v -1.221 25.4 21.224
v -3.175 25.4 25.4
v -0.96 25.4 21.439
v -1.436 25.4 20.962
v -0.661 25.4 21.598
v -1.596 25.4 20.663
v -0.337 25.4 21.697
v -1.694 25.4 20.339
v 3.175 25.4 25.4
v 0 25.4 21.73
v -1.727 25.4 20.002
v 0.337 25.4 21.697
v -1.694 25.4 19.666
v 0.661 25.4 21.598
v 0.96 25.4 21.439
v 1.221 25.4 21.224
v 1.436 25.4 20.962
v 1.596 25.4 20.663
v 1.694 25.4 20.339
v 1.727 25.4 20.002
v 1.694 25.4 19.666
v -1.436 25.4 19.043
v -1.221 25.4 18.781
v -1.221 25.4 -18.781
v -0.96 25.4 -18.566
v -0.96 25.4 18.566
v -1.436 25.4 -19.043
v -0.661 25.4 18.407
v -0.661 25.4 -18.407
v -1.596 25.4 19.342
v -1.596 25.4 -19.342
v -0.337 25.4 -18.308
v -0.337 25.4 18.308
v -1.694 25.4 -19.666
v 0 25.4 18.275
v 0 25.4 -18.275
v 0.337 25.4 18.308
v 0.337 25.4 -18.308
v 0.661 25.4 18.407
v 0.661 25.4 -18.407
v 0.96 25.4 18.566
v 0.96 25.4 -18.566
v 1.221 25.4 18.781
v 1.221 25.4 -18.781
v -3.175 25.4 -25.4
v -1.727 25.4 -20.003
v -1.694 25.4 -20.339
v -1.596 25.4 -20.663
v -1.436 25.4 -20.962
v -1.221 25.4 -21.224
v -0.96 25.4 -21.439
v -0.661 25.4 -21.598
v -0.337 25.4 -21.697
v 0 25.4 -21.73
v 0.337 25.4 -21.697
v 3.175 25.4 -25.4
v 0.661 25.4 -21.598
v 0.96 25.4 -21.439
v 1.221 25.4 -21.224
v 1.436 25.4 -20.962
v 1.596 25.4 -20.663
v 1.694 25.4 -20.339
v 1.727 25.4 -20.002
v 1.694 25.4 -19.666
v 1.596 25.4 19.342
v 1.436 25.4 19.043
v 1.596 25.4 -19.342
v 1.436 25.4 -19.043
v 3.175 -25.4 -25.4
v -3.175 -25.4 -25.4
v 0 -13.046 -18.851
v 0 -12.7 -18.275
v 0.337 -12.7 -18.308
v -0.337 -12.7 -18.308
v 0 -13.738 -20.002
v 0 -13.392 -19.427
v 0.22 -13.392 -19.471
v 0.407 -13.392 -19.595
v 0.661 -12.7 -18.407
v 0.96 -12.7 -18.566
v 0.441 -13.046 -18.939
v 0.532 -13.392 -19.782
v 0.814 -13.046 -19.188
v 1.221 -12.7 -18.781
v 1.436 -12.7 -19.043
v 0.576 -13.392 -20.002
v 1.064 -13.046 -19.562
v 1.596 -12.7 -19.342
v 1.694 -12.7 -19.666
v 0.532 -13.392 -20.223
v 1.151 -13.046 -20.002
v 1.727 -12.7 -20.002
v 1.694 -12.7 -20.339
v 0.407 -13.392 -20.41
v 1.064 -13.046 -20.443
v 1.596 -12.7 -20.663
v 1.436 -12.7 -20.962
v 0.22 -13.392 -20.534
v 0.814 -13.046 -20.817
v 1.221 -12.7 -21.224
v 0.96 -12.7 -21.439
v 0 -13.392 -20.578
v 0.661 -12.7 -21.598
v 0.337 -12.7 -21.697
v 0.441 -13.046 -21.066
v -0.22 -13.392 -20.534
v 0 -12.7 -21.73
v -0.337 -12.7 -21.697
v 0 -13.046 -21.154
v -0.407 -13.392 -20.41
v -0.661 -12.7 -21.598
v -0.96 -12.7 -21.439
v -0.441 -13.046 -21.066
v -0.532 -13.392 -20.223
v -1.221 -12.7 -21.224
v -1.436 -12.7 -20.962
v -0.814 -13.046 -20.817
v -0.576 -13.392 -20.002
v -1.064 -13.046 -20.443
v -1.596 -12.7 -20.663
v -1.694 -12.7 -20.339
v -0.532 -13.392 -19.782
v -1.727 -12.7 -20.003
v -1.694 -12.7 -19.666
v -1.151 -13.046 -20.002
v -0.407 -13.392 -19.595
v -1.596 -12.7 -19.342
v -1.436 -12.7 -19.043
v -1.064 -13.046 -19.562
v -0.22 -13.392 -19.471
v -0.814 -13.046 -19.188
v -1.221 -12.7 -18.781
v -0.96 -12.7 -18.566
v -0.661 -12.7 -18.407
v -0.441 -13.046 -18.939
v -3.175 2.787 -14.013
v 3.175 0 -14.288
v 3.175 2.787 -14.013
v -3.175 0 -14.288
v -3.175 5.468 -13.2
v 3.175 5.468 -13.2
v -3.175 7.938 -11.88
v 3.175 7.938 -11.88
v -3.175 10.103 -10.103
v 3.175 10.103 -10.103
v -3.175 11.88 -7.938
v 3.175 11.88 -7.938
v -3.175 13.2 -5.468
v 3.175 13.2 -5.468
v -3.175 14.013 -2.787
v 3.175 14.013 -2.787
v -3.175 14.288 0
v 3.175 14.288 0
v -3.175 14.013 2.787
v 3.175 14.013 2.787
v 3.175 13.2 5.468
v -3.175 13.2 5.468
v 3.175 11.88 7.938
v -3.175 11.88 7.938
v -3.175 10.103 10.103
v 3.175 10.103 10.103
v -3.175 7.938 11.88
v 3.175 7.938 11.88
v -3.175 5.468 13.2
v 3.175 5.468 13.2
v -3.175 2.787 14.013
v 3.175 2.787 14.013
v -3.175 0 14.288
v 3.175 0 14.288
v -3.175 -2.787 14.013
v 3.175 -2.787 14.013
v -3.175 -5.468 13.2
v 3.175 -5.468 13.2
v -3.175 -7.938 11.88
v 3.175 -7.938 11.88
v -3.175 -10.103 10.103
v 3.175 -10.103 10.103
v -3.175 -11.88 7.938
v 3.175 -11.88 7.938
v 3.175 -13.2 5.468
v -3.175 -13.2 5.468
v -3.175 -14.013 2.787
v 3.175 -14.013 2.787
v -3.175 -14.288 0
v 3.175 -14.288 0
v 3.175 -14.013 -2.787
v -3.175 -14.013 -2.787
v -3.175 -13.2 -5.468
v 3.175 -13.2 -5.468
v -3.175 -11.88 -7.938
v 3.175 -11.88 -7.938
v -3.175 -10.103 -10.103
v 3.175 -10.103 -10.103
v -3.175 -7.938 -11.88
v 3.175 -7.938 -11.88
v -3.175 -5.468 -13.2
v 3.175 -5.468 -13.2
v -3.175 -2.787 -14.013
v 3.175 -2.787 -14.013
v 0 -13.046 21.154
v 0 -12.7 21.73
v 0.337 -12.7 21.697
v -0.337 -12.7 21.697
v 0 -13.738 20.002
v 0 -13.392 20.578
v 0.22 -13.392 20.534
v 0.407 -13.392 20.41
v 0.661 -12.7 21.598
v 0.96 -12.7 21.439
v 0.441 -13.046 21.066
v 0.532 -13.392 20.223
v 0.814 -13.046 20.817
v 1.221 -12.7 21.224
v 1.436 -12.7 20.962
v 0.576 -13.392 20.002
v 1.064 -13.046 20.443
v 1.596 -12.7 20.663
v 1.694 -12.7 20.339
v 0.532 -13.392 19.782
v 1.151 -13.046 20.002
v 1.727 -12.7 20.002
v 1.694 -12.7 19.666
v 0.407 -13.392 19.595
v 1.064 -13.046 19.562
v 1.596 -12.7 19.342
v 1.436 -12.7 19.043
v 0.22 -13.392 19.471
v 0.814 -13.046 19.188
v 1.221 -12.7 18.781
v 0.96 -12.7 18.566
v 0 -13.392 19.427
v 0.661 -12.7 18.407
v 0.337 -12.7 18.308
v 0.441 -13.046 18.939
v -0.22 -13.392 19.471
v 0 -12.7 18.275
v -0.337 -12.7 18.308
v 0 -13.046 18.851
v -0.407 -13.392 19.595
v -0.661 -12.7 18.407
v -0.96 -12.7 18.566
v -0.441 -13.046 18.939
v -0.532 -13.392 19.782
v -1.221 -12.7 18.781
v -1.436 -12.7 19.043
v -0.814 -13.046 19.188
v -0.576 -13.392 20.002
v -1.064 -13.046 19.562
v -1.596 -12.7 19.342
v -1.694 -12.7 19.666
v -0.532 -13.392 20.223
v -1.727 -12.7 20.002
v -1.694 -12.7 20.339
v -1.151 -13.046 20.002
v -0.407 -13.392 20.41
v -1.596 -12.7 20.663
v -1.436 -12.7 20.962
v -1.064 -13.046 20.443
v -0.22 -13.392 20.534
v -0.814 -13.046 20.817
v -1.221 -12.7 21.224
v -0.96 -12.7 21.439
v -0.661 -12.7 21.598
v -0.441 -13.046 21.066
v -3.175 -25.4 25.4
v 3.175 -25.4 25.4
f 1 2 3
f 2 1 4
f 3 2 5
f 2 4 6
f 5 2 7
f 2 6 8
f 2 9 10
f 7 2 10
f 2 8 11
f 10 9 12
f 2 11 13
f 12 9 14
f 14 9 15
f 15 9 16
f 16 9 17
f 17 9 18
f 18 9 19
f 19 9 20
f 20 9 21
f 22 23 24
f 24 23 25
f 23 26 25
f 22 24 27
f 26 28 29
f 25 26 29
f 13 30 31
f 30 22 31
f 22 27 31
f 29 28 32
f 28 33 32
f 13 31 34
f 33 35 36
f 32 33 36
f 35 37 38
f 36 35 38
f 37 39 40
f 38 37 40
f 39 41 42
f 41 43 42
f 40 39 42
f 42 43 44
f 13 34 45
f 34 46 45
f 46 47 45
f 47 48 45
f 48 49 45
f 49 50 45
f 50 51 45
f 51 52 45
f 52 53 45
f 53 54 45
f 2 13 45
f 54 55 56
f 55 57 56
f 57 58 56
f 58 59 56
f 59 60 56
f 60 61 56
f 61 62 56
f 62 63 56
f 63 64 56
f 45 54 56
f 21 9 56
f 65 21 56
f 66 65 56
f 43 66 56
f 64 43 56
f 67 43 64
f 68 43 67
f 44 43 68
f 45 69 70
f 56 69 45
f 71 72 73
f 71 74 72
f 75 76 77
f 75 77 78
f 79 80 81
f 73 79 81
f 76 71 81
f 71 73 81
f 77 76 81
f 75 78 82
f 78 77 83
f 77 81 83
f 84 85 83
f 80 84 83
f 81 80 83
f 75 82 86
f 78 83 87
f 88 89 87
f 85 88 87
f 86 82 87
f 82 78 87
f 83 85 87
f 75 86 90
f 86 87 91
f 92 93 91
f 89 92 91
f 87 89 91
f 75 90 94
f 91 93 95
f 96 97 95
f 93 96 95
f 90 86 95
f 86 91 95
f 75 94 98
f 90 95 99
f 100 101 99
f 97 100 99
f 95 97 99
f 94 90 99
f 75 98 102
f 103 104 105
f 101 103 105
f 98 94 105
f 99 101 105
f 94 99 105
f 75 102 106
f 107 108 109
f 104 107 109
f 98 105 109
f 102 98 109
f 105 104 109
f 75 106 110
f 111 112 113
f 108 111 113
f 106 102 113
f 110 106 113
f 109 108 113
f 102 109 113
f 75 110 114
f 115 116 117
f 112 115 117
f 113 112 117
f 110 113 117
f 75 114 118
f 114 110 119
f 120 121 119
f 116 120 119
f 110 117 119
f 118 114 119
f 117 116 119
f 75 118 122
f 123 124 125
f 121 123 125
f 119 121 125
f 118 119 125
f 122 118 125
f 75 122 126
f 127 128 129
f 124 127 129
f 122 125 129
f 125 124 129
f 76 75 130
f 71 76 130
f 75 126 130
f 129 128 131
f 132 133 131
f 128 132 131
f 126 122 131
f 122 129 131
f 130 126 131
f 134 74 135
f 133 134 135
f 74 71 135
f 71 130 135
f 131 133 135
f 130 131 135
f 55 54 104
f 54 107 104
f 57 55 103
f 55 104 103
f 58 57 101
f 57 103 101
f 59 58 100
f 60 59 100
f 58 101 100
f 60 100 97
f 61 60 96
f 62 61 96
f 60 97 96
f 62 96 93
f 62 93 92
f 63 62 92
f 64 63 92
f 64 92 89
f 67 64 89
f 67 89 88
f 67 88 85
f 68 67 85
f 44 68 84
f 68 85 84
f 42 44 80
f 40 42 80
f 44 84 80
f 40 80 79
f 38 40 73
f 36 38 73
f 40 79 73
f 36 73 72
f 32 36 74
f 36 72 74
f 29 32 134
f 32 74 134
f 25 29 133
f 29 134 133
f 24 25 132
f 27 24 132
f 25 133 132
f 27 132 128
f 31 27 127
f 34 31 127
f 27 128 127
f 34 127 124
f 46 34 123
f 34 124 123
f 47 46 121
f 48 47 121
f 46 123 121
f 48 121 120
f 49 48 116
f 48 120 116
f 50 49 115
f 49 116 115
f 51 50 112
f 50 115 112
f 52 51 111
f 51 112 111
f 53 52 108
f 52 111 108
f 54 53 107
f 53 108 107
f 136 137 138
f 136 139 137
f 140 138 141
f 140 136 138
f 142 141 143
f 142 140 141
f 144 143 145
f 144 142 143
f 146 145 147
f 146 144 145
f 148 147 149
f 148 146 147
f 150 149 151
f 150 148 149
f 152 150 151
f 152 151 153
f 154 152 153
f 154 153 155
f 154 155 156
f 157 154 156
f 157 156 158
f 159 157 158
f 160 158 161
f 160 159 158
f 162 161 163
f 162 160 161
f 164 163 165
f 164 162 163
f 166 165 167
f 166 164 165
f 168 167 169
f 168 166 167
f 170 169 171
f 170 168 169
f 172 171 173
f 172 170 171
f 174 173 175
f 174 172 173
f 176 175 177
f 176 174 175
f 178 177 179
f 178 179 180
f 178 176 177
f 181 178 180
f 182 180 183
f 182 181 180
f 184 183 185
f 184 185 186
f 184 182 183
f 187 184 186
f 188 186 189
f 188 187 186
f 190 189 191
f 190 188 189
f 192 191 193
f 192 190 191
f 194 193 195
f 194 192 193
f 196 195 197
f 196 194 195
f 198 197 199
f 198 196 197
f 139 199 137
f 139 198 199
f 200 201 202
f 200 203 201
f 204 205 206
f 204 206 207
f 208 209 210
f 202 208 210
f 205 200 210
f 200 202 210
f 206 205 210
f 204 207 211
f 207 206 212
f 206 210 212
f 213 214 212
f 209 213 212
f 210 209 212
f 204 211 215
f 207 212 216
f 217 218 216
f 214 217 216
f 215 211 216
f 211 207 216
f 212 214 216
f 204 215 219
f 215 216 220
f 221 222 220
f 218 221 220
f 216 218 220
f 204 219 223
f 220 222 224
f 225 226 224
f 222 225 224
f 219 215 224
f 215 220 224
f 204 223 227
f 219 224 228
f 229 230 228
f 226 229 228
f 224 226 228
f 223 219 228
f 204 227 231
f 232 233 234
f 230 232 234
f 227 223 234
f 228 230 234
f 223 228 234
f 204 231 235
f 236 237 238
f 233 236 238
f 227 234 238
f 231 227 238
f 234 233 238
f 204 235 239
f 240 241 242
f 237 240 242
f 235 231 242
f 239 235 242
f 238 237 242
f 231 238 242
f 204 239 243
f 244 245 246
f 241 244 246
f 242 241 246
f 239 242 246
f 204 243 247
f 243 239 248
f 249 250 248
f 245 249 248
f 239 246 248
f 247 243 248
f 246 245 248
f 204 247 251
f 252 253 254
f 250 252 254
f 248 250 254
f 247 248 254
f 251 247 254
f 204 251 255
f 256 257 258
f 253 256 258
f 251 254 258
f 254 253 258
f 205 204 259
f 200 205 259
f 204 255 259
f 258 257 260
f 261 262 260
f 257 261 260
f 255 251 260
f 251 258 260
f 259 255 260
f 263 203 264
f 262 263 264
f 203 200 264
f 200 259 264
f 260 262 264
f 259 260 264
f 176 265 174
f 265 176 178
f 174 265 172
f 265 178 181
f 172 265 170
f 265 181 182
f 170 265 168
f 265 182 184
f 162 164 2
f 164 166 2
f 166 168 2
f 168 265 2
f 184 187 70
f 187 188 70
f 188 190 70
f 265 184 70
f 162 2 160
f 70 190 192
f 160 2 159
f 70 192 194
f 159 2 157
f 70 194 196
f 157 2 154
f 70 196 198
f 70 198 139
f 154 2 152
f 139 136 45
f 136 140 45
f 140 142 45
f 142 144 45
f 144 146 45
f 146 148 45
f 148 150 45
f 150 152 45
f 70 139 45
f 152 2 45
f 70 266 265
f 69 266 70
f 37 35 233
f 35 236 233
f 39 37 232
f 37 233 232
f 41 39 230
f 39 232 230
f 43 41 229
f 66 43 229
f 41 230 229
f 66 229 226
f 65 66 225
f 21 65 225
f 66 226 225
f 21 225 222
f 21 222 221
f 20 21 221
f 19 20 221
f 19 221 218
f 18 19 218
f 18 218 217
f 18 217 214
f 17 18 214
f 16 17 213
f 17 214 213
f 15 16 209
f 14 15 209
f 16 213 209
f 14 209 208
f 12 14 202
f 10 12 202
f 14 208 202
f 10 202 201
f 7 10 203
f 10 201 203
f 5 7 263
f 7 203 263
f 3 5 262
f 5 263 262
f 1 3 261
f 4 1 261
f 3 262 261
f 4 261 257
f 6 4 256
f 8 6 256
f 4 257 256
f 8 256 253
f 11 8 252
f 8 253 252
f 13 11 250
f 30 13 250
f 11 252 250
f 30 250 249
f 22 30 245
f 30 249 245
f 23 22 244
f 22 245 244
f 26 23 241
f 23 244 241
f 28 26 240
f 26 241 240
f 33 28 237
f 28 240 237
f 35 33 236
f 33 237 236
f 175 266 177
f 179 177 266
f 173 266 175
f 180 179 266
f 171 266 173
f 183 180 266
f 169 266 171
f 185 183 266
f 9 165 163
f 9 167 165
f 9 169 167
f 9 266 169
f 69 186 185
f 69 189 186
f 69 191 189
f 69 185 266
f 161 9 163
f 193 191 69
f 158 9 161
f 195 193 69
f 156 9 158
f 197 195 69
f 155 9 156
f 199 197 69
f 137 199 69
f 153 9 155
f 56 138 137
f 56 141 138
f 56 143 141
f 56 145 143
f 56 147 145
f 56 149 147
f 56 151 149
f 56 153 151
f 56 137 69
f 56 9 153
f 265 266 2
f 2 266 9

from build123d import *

# Parameters (mm, degrees)
SKETCH1_W                       = 50.8
SKETCH1_H                       = 50.8
SKETCH1_R                       = 14.2875
BOSS_EXTRUDE1_DEPTH             = 3.175
F_29_0_136_DIAMETER_HOLE1_D     = 3.4544
F_29_0_136_DIAMETER_HOLE1_DEPTH = 38.1
F_29_0_136_DIAMETER_HOLE1_TIP   = 1.037806461


with BuildPart() as part:
    # Sketch1 → Boss-Extrude1 (new, symmetric)
    with BuildSketch(Plane(origin=(0, 0, 0), x_dir=(0, 0, -1), z_dir=(1, 0, 0))):
        Rectangle(SKETCH1_W, SKETCH1_H)
        Circle(SKETCH1_R, mode=Mode.SUBTRACT)
    extrude(amount=BOSS_EXTRUDE1_DEPTH, both=True)

    # #29 (0.136) Diameter Hole1
    with Locations(Plane(origin=(0, 25.4, 20.0025), x_dir=(0, 0, 1), z_dir=(0, 1, 0))):
        with Locations((0, 0), (-40.005, 0)):
            Hole(F_29_0_136_DIAMETER_HOLE1_D / 2, depth=F_29_0_136_DIAMETER_HOLE1_DEPTH)
            with Locations((0, 0, -(F_29_0_136_DIAMETER_HOLE1_DEPTH + F_29_0_136_DIAMETER_HOLE1_TIP / 2))):  # 118° drill point
                Cone(0, F_29_0_136_DIAMETER_HOLE1_D / 2, F_29_0_136_DIAMETER_HOLE1_TIP, mode=Mode.SUBTRACT)


solid = part.part
